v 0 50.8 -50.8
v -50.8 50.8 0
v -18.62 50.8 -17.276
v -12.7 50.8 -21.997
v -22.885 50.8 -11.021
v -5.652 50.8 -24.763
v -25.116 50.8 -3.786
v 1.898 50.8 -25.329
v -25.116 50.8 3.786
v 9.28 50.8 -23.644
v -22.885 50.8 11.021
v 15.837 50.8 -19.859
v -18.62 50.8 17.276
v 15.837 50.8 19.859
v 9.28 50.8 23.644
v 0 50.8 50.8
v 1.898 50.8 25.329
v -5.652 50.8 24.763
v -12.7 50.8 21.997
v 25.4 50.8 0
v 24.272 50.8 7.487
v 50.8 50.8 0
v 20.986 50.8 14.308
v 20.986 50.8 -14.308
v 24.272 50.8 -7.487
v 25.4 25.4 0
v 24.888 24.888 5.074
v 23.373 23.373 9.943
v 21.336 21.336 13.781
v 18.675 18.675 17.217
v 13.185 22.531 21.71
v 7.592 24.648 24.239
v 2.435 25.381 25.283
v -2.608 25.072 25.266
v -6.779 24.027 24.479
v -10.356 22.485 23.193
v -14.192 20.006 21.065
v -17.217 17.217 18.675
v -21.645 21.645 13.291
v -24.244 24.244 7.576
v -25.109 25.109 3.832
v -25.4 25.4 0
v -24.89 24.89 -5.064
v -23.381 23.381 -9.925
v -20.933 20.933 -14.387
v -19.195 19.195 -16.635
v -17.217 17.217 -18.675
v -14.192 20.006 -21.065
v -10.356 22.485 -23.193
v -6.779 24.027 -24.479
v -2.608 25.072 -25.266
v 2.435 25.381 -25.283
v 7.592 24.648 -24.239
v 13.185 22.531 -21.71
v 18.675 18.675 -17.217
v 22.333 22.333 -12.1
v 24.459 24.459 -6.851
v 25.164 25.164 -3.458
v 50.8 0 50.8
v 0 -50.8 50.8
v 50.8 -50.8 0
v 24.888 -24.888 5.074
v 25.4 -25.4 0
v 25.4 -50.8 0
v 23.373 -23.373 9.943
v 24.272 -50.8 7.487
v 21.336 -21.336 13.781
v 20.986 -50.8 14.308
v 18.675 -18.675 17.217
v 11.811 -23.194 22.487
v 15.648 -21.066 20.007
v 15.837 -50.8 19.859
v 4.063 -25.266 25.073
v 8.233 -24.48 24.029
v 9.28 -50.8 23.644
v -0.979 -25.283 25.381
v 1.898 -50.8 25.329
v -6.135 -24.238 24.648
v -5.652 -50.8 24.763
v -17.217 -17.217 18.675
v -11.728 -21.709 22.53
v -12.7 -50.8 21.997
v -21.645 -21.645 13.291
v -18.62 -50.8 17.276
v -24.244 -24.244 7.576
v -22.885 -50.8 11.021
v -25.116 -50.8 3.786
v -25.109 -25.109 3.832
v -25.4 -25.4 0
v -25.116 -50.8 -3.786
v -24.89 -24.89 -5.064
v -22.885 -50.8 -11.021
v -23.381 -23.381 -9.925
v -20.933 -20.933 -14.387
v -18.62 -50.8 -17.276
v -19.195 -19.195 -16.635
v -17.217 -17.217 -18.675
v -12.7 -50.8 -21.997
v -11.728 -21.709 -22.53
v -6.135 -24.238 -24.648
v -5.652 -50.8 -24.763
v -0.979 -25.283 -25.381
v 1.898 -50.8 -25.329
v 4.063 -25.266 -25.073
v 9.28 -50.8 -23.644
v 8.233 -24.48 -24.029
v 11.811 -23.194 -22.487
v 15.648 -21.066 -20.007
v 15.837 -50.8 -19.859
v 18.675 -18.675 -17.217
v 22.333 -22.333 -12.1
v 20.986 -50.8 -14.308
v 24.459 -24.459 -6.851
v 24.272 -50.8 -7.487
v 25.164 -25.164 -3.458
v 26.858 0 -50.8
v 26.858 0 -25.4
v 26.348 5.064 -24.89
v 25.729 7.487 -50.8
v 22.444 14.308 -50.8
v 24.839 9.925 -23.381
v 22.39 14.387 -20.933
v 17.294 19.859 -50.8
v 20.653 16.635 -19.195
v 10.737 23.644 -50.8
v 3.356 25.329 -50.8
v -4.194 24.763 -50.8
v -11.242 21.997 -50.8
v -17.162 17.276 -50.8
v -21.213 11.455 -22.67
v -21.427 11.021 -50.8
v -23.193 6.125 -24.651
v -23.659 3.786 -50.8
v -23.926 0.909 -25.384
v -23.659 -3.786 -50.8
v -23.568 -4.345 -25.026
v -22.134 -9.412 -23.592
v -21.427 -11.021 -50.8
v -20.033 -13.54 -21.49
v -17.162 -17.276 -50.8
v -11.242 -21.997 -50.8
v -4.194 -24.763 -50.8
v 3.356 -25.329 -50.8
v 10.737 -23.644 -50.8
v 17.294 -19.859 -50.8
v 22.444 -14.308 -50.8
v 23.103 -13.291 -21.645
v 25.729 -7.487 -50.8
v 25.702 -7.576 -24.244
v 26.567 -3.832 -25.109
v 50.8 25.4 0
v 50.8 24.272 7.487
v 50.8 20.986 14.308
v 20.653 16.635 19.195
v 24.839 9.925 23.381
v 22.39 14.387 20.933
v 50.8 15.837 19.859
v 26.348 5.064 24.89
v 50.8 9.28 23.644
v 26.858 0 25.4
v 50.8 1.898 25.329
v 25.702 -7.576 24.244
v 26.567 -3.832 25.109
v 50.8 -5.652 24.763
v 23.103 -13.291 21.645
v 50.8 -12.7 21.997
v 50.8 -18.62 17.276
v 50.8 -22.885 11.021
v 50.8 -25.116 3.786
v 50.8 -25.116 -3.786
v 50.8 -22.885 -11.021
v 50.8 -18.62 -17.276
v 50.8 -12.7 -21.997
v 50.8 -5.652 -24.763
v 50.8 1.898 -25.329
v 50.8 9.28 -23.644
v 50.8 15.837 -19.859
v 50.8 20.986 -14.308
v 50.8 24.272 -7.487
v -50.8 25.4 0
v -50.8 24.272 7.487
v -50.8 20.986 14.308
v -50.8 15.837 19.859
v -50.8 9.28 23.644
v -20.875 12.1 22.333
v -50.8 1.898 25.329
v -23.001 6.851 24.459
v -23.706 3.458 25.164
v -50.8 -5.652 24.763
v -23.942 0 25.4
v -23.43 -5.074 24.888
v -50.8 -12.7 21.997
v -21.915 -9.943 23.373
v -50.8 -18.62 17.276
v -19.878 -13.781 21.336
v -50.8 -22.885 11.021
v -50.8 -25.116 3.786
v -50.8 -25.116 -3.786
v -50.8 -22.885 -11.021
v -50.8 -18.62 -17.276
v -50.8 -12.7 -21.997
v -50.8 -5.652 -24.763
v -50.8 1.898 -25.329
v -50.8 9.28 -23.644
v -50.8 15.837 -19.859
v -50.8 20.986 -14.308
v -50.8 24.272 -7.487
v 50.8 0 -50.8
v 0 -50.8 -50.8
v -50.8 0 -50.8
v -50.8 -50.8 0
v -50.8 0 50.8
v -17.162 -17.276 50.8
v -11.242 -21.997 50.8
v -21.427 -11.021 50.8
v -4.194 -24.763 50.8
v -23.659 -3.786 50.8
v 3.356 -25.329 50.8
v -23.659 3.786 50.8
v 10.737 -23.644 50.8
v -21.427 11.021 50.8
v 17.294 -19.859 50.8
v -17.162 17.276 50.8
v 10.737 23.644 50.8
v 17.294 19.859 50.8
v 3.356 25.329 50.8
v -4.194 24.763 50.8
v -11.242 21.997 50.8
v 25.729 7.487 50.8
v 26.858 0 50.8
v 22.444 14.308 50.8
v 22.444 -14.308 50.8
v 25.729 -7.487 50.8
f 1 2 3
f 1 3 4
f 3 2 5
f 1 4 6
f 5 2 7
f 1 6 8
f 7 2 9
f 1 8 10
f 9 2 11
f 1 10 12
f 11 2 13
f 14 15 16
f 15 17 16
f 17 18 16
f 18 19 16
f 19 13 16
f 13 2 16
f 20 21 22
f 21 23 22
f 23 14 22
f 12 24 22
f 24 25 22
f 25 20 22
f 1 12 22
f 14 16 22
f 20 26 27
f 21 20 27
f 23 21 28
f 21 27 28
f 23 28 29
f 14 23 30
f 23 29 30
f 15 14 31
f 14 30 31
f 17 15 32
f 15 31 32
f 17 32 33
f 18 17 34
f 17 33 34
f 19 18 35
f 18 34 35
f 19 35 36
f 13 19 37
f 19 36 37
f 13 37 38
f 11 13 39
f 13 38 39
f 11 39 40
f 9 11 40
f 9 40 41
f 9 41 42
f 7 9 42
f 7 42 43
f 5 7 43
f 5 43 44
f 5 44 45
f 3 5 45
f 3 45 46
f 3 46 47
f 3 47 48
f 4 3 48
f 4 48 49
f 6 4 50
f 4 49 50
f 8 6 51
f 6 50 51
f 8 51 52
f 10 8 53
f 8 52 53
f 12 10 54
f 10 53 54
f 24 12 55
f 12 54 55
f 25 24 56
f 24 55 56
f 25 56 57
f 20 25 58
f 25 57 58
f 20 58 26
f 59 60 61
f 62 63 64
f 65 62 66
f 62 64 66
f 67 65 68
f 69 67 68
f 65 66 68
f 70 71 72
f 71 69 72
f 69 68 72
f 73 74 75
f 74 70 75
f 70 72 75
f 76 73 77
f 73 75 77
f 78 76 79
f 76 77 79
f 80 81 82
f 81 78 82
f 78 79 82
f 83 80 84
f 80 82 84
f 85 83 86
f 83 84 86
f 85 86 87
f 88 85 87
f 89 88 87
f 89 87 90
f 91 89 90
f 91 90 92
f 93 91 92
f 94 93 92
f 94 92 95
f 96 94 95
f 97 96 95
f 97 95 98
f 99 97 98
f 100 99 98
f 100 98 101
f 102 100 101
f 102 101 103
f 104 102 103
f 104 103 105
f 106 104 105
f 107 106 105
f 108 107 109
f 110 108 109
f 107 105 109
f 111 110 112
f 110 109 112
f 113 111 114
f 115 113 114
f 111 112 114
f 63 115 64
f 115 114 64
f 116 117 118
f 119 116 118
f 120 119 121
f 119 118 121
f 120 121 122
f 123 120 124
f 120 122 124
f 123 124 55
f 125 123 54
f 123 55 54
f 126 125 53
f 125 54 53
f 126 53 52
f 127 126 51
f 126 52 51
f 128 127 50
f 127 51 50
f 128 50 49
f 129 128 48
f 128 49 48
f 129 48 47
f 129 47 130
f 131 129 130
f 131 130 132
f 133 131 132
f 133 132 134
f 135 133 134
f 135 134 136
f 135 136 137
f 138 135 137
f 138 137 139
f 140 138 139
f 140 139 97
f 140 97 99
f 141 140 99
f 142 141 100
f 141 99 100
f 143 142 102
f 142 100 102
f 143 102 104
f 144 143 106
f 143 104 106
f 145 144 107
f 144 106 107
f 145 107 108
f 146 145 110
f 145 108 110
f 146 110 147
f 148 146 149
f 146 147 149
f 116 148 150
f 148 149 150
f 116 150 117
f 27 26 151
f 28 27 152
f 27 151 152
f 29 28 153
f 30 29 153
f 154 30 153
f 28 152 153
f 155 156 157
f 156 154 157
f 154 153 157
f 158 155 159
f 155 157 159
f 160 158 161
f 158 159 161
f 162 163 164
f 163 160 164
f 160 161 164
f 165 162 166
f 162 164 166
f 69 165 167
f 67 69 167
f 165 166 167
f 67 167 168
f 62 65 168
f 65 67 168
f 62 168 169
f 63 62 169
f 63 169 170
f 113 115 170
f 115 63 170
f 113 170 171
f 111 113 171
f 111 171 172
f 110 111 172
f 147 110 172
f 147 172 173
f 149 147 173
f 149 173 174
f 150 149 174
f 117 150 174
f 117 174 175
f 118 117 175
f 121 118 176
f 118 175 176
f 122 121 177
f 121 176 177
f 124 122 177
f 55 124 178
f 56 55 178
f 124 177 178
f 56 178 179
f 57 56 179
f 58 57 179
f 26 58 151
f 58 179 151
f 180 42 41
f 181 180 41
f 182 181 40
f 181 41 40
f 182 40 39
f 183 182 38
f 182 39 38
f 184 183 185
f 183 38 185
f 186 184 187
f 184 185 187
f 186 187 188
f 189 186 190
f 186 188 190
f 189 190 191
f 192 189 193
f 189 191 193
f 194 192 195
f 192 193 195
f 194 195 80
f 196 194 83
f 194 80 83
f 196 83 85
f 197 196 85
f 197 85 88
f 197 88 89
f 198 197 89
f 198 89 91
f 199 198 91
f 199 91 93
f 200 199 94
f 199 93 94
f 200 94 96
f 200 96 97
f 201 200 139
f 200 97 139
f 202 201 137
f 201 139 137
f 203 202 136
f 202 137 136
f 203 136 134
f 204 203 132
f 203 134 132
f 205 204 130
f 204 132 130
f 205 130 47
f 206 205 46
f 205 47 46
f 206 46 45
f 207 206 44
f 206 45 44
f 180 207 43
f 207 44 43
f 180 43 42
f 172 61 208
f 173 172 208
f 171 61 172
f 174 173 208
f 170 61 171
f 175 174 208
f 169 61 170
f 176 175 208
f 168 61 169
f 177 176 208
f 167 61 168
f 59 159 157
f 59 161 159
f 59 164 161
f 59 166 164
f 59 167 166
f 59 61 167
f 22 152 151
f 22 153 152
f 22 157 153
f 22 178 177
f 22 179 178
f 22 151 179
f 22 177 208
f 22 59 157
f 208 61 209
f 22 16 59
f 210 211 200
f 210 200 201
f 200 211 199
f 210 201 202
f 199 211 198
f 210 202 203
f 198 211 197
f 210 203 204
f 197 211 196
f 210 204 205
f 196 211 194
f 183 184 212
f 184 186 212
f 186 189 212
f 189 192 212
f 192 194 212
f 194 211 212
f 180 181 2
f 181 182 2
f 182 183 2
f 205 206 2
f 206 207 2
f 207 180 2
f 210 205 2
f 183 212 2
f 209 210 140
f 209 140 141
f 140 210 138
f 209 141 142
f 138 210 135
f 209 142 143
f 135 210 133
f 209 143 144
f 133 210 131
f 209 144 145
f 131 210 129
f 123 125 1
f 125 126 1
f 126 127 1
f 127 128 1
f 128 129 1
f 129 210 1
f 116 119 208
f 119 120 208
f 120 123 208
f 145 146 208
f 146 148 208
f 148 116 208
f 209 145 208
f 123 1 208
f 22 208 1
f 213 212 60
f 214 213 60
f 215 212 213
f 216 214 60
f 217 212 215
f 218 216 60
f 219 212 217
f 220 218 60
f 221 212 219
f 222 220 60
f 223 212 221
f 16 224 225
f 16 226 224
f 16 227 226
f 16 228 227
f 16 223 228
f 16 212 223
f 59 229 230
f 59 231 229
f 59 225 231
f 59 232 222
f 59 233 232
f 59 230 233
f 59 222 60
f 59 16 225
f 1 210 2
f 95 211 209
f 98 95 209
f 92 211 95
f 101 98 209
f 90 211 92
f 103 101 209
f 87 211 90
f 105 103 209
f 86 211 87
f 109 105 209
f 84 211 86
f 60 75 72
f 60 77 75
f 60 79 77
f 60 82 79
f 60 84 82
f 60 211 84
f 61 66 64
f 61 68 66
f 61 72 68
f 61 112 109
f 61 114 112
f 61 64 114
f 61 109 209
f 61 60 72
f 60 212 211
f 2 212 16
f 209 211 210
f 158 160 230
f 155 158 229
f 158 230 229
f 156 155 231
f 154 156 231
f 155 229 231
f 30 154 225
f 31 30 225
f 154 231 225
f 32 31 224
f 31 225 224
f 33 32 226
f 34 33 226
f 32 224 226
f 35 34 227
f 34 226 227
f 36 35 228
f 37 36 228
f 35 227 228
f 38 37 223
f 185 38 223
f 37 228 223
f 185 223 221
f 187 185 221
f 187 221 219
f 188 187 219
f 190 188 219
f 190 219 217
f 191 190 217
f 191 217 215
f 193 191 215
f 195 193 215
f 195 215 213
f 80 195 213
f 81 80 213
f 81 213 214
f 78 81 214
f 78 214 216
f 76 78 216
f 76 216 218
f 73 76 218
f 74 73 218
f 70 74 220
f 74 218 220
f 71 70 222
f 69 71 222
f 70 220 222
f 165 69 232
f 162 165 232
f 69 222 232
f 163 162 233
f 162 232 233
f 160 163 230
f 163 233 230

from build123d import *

# Parameters (mm, degrees)
F0_W      = 101.6
F0_H      = 101.6
F1_DEPTH  = 50.8
F6_W      = 98.9533215761
F6_H      = 109.5847634133
F7_DEPTH  = 29.3303936748
F9_R      = 55.4258032392
F10_DEPTH = 29.3303936748
F12_R     = 66.861305092
F13_DEPTH = 29.3303936748
F15_R     = 63.7455085669
F16_DEPTH = 29.3303936748
F21_R     = 117.7935216741
F22_DEPTH = 29.3303936748
F24_R     = 77.2031317043
F25_DEPTH = 29.3303936748
F27_R     = 77.6037163902
F28_DEPTH = 29.3303936748
F30_R     = 68.124609224
F31_DEPTH = 29.3303936748
F32_R     = 25.4
F33_DEPTH = 101.601
F34_R     = 25.4
F35_DEPTH = 101.601
F36_R     = 25.4
F37_DEPTH = 101.601


with BuildPart() as f1:
    # F0 (on Top) → F1 (new body, symmetric)
    with BuildSketch(Plane.XY):
        Rectangle(F0_W, F0_H)
    extrude(amount=F1_DEPTH, both=True)

    # F6 (on face) → F7 (cut, through all)
    with BuildSketch(Plane(origin=(-33.8666666667, -33.8666666667, 33.8666666667), x_dir=(0.8164965809, -0.4082482905, 0.4082482905), z_dir=(-0.5773502692, -0.5773502692, 0.5773502692))):
        with Locations((0, -1.2222639052)):
            Rectangle(F6_W, F6_H)
    extrude(amount=F7_DEPTH, mode=Mode.SUBTRACT)

    # F9 (on face) → F10 (cut, through all)
    with BuildSketch(Plane(origin=(33.8666666667, -33.8666666667, 33.8666666667), x_dir=(0.8164965809, 0.4082482905, -0.4082482905), z_dir=(-0.5773502692, 0.5773502692, -0.5773502692))):
        with Locations((-7.7910861, -7.1166269481)):
            Circle(F9_R)
    extrude(amount=-F10_DEPTH, mode=Mode.SUBTRACT)

    # F12 (on face) → F13 (cut, through all)
    with BuildSketch(Plane(origin=(-33.8666666667, 33.8666666667, 33.8666666667), x_dir=(0.8164965809, 0.4082482905, 0.4082482905), z_dir=(0.5773502692, -0.5773502692, -0.5773502692))):
        with Locations((-13.3071886376, -3.545607673)):
            Circle(F12_R)
    extrude(amount=-F13_DEPTH, mode=Mode.SUBTRACT)

    # F15 (on face) → F16 (cut, through all)
    with BuildSketch(Plane(origin=(-33.8666666667, -33.8666666667, -33.8666666667), x_dir=(0.8164965809, -0.4082482905, -0.4082482905), z_dir=(-0.5773502692, -0.5773502692, -0.5773502692))):
        with Locations((-3.3120266162, -3.843720071)):
            Circle(F15_R)
    extrude(amount=F16_DEPTH, mode=Mode.SUBTRACT)

    # F21 (on face) → F22 (cut, through all)
    with BuildSketch(Plane(origin=(33.8666666667, 33.8666666667, 33.8666666667), x_dir=(0.8164965809, -0.4082482905, -0.4082482905), z_dir=(-0.5773502692, -0.5773502692, -0.5773502692))):
        with Locations((0, -4.4537498616)):
            Circle(F21_R)
    extrude(amount=-F22_DEPTH, mode=Mode.SUBTRACT)

    # F24 (on face) → F25 (cut, through all)
    with BuildSketch(Plane(origin=(33.8666666667, 33.8666666667, -33.8666666667), x_dir=(-0.4082482905, 0.8164965809, 0.4082482905), z_dir=(0.5773502692, 0.5773502692, -0.5773502692))):
        with Locations((-11.0818976536, -8.1726238132)):
            Circle(F24_R)
    extrude(amount=F25_DEPTH, mode=Mode.SUBTRACT)

    # F27 (on face) → F28 (cut, through all)
    with BuildSketch(Plane(origin=(33.8666666667, -33.8666666667, -33.8666666667), x_dir=(-0.8164965809, -0.4082482905, -0.4082482905), z_dir=(-0.5773502692, 0.5773502692, 0.5773502692))):
        with Locations((0, -3.7476688158)):
            Circle(F27_R)
    extrude(amount=-F28_DEPTH, mode=Mode.SUBTRACT)

    # F30 (on face) → F31 (cut, through all)
    with BuildSketch(Plane(origin=(-33.8666666667, 33.8666666667, -33.8666666667), x_dir=(0.4082482905, 0.8164965809, 0.4082482905), z_dir=(0.5773502692, -0.5773502692, 0.5773502692))):
        with Locations((-6.1401822604, -7.8550539911)):
            Circle(F30_R)
    extrude(amount=-F31_DEPTH, mode=Mode.SUBTRACT)

    # F32 (on face) → F33 (cut, through all)
    with BuildSketch(Plane.XY.offset(50.8)):
        with Locations((1.4577903733, 0)):
            Circle(F32_R)
    extrude(amount=-F33_DEPTH, mode=Mode.SUBTRACT)

    # F34 (on face) → F35 (cut, through all)
    with BuildSketch(Plane.XZ.offset(50.8)):
        Circle(F34_R)
    extrude(amount=-F35_DEPTH, mode=Mode.SUBTRACT)

    # F36 (on face) → F37 (cut, through all)
    with BuildSketch(Plane.YZ.offset(50.8)):
        Circle(F36_R)
    extrude(amount=-F37_DEPTH, mode=Mode.SUBTRACT)


solid = f1.part
